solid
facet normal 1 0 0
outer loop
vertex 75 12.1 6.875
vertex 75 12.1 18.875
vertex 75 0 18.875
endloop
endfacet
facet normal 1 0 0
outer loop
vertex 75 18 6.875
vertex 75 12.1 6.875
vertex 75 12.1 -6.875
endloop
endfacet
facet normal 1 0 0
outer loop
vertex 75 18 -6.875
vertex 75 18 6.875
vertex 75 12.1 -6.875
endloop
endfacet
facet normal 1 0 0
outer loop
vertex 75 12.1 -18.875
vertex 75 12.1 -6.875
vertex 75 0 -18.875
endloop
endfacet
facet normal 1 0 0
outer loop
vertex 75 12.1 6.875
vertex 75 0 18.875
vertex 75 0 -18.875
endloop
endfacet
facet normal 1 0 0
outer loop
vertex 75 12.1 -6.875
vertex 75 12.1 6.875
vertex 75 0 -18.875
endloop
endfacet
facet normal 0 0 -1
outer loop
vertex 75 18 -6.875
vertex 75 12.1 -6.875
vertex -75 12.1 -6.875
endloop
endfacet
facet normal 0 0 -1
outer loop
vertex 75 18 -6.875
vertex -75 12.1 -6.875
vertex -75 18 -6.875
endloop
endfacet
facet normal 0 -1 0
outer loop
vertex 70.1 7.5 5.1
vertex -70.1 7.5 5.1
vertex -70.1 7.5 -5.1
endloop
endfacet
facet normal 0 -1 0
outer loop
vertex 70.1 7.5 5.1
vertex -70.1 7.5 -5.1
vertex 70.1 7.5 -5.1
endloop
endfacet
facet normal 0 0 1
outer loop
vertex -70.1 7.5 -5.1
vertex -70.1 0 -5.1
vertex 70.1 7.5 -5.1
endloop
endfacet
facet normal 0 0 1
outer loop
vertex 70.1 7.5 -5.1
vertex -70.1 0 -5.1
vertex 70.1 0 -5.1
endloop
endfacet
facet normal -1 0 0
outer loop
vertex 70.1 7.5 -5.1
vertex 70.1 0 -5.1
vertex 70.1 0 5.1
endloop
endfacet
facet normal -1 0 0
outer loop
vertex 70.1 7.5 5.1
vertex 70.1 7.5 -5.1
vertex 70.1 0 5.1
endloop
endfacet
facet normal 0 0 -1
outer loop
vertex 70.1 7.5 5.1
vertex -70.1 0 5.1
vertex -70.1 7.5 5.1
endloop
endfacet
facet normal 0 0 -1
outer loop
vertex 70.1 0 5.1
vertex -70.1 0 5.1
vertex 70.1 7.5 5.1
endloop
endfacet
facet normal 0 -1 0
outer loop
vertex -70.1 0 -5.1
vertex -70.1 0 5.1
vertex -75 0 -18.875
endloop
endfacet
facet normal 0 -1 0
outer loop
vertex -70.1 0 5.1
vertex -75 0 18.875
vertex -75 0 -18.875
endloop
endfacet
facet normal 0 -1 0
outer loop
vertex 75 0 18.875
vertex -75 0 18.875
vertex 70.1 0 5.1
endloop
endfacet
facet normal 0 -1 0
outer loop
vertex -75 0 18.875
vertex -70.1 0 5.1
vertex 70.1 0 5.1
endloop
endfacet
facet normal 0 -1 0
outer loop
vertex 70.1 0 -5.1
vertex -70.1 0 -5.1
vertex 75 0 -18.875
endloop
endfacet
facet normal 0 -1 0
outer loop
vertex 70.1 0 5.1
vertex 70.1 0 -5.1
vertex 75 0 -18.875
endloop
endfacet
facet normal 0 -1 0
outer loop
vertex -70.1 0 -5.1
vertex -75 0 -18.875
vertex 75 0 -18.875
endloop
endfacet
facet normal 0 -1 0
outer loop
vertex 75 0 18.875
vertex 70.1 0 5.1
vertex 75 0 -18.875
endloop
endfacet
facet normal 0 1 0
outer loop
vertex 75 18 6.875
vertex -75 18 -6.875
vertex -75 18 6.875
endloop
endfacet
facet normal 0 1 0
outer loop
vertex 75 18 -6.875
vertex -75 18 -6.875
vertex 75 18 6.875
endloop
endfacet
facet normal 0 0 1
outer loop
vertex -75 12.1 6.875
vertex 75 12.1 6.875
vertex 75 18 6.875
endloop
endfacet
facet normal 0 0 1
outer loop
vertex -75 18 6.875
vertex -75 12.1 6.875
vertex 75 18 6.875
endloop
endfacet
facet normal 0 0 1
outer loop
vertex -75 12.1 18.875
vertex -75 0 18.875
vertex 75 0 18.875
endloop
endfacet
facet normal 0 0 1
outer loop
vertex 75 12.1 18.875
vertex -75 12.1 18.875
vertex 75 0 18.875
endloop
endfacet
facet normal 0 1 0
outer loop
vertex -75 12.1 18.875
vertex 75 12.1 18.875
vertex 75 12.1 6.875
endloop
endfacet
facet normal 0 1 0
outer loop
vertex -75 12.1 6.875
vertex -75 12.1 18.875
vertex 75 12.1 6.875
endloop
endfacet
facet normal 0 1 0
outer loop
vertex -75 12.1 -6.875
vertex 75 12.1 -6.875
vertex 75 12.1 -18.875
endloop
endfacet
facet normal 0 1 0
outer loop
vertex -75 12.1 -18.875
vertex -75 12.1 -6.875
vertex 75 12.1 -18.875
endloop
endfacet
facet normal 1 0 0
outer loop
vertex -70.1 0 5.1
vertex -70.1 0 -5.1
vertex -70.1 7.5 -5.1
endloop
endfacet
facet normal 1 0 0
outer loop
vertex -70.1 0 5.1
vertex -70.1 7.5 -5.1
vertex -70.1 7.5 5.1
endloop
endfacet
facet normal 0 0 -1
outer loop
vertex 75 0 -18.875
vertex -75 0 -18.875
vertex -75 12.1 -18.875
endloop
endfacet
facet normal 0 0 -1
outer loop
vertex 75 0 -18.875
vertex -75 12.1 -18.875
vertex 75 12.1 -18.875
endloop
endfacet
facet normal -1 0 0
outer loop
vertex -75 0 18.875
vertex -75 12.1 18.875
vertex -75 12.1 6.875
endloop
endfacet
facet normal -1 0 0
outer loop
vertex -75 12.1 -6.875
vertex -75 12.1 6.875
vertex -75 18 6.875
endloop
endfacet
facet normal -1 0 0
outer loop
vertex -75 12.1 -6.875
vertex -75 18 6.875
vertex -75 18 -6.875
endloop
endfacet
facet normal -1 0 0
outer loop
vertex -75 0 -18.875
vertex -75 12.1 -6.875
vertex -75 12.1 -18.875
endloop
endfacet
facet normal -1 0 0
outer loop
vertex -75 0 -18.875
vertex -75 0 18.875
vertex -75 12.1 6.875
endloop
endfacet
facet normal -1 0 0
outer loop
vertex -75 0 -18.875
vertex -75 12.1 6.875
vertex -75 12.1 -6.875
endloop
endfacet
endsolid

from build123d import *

# Parameters (mm, degrees)
SKETCH1_W           = 150
SKETCH1_H           = 37.75
BOSS_EXTRUDE1_DEPTH = 18
SKETCH2_W           = 12
SKETCH2_H           = 5.9
CUT_EXTRUDE1_DEPTH  = 150
SKETCH3_W           = 12
SKETCH3_H           = 5.9
CUT_EXTRUDE2_DEPTH  = 150
SKETCH4_W           = 140.2
SKETCH4_H           = 10.2
CUT_EXTRUDE3_DEPTH  = 7.5


with BuildPart() as part:
    # Sketch1 → Boss-Extrude1 (new body)
    with BuildSketch(Plane(origin=(0, 0, 0), x_dir=(1, 0, 0), z_dir=(0, 1, 0))):
        Rectangle(SKETCH1_W, SKETCH1_H)
    extrude(amount=BOSS_EXTRUDE1_DEPTH)

    # Sketch2 → Cut-Extrude1 (cut)
    with BuildSketch(Plane(origin=(75, 0, 0), x_dir=(0, 0, -1), z_dir=(1, 0, 0))):
        with Locations((-12.875, 15.05)):
            Rectangle(SKETCH2_W, SKETCH2_H)
    extrude(amount=-CUT_EXTRUDE1_DEPTH, mode=Mode.SUBTRACT)

    # Sketch3 → Cut-Extrude2 (cut)
    with BuildSketch(Plane(origin=(75, 0, 0), x_dir=(0, 0, -1), z_dir=(1, 0, 0))):
        with Locations((12.875, 15.05)):
            Rectangle(SKETCH3_W, SKETCH3_H)
    extrude(amount=-CUT_EXTRUDE2_DEPTH, mode=Mode.SUBTRACT)

    # Sketch4 → Cut-Extrude3 (cut)
    with BuildSketch(Plane.XZ):
        Rectangle(SKETCH4_W, SKETCH4_H)
    extrude(amount=-CUT_EXTRUDE3_DEPTH, mode=Mode.SUBTRACT)


solid = part.part
